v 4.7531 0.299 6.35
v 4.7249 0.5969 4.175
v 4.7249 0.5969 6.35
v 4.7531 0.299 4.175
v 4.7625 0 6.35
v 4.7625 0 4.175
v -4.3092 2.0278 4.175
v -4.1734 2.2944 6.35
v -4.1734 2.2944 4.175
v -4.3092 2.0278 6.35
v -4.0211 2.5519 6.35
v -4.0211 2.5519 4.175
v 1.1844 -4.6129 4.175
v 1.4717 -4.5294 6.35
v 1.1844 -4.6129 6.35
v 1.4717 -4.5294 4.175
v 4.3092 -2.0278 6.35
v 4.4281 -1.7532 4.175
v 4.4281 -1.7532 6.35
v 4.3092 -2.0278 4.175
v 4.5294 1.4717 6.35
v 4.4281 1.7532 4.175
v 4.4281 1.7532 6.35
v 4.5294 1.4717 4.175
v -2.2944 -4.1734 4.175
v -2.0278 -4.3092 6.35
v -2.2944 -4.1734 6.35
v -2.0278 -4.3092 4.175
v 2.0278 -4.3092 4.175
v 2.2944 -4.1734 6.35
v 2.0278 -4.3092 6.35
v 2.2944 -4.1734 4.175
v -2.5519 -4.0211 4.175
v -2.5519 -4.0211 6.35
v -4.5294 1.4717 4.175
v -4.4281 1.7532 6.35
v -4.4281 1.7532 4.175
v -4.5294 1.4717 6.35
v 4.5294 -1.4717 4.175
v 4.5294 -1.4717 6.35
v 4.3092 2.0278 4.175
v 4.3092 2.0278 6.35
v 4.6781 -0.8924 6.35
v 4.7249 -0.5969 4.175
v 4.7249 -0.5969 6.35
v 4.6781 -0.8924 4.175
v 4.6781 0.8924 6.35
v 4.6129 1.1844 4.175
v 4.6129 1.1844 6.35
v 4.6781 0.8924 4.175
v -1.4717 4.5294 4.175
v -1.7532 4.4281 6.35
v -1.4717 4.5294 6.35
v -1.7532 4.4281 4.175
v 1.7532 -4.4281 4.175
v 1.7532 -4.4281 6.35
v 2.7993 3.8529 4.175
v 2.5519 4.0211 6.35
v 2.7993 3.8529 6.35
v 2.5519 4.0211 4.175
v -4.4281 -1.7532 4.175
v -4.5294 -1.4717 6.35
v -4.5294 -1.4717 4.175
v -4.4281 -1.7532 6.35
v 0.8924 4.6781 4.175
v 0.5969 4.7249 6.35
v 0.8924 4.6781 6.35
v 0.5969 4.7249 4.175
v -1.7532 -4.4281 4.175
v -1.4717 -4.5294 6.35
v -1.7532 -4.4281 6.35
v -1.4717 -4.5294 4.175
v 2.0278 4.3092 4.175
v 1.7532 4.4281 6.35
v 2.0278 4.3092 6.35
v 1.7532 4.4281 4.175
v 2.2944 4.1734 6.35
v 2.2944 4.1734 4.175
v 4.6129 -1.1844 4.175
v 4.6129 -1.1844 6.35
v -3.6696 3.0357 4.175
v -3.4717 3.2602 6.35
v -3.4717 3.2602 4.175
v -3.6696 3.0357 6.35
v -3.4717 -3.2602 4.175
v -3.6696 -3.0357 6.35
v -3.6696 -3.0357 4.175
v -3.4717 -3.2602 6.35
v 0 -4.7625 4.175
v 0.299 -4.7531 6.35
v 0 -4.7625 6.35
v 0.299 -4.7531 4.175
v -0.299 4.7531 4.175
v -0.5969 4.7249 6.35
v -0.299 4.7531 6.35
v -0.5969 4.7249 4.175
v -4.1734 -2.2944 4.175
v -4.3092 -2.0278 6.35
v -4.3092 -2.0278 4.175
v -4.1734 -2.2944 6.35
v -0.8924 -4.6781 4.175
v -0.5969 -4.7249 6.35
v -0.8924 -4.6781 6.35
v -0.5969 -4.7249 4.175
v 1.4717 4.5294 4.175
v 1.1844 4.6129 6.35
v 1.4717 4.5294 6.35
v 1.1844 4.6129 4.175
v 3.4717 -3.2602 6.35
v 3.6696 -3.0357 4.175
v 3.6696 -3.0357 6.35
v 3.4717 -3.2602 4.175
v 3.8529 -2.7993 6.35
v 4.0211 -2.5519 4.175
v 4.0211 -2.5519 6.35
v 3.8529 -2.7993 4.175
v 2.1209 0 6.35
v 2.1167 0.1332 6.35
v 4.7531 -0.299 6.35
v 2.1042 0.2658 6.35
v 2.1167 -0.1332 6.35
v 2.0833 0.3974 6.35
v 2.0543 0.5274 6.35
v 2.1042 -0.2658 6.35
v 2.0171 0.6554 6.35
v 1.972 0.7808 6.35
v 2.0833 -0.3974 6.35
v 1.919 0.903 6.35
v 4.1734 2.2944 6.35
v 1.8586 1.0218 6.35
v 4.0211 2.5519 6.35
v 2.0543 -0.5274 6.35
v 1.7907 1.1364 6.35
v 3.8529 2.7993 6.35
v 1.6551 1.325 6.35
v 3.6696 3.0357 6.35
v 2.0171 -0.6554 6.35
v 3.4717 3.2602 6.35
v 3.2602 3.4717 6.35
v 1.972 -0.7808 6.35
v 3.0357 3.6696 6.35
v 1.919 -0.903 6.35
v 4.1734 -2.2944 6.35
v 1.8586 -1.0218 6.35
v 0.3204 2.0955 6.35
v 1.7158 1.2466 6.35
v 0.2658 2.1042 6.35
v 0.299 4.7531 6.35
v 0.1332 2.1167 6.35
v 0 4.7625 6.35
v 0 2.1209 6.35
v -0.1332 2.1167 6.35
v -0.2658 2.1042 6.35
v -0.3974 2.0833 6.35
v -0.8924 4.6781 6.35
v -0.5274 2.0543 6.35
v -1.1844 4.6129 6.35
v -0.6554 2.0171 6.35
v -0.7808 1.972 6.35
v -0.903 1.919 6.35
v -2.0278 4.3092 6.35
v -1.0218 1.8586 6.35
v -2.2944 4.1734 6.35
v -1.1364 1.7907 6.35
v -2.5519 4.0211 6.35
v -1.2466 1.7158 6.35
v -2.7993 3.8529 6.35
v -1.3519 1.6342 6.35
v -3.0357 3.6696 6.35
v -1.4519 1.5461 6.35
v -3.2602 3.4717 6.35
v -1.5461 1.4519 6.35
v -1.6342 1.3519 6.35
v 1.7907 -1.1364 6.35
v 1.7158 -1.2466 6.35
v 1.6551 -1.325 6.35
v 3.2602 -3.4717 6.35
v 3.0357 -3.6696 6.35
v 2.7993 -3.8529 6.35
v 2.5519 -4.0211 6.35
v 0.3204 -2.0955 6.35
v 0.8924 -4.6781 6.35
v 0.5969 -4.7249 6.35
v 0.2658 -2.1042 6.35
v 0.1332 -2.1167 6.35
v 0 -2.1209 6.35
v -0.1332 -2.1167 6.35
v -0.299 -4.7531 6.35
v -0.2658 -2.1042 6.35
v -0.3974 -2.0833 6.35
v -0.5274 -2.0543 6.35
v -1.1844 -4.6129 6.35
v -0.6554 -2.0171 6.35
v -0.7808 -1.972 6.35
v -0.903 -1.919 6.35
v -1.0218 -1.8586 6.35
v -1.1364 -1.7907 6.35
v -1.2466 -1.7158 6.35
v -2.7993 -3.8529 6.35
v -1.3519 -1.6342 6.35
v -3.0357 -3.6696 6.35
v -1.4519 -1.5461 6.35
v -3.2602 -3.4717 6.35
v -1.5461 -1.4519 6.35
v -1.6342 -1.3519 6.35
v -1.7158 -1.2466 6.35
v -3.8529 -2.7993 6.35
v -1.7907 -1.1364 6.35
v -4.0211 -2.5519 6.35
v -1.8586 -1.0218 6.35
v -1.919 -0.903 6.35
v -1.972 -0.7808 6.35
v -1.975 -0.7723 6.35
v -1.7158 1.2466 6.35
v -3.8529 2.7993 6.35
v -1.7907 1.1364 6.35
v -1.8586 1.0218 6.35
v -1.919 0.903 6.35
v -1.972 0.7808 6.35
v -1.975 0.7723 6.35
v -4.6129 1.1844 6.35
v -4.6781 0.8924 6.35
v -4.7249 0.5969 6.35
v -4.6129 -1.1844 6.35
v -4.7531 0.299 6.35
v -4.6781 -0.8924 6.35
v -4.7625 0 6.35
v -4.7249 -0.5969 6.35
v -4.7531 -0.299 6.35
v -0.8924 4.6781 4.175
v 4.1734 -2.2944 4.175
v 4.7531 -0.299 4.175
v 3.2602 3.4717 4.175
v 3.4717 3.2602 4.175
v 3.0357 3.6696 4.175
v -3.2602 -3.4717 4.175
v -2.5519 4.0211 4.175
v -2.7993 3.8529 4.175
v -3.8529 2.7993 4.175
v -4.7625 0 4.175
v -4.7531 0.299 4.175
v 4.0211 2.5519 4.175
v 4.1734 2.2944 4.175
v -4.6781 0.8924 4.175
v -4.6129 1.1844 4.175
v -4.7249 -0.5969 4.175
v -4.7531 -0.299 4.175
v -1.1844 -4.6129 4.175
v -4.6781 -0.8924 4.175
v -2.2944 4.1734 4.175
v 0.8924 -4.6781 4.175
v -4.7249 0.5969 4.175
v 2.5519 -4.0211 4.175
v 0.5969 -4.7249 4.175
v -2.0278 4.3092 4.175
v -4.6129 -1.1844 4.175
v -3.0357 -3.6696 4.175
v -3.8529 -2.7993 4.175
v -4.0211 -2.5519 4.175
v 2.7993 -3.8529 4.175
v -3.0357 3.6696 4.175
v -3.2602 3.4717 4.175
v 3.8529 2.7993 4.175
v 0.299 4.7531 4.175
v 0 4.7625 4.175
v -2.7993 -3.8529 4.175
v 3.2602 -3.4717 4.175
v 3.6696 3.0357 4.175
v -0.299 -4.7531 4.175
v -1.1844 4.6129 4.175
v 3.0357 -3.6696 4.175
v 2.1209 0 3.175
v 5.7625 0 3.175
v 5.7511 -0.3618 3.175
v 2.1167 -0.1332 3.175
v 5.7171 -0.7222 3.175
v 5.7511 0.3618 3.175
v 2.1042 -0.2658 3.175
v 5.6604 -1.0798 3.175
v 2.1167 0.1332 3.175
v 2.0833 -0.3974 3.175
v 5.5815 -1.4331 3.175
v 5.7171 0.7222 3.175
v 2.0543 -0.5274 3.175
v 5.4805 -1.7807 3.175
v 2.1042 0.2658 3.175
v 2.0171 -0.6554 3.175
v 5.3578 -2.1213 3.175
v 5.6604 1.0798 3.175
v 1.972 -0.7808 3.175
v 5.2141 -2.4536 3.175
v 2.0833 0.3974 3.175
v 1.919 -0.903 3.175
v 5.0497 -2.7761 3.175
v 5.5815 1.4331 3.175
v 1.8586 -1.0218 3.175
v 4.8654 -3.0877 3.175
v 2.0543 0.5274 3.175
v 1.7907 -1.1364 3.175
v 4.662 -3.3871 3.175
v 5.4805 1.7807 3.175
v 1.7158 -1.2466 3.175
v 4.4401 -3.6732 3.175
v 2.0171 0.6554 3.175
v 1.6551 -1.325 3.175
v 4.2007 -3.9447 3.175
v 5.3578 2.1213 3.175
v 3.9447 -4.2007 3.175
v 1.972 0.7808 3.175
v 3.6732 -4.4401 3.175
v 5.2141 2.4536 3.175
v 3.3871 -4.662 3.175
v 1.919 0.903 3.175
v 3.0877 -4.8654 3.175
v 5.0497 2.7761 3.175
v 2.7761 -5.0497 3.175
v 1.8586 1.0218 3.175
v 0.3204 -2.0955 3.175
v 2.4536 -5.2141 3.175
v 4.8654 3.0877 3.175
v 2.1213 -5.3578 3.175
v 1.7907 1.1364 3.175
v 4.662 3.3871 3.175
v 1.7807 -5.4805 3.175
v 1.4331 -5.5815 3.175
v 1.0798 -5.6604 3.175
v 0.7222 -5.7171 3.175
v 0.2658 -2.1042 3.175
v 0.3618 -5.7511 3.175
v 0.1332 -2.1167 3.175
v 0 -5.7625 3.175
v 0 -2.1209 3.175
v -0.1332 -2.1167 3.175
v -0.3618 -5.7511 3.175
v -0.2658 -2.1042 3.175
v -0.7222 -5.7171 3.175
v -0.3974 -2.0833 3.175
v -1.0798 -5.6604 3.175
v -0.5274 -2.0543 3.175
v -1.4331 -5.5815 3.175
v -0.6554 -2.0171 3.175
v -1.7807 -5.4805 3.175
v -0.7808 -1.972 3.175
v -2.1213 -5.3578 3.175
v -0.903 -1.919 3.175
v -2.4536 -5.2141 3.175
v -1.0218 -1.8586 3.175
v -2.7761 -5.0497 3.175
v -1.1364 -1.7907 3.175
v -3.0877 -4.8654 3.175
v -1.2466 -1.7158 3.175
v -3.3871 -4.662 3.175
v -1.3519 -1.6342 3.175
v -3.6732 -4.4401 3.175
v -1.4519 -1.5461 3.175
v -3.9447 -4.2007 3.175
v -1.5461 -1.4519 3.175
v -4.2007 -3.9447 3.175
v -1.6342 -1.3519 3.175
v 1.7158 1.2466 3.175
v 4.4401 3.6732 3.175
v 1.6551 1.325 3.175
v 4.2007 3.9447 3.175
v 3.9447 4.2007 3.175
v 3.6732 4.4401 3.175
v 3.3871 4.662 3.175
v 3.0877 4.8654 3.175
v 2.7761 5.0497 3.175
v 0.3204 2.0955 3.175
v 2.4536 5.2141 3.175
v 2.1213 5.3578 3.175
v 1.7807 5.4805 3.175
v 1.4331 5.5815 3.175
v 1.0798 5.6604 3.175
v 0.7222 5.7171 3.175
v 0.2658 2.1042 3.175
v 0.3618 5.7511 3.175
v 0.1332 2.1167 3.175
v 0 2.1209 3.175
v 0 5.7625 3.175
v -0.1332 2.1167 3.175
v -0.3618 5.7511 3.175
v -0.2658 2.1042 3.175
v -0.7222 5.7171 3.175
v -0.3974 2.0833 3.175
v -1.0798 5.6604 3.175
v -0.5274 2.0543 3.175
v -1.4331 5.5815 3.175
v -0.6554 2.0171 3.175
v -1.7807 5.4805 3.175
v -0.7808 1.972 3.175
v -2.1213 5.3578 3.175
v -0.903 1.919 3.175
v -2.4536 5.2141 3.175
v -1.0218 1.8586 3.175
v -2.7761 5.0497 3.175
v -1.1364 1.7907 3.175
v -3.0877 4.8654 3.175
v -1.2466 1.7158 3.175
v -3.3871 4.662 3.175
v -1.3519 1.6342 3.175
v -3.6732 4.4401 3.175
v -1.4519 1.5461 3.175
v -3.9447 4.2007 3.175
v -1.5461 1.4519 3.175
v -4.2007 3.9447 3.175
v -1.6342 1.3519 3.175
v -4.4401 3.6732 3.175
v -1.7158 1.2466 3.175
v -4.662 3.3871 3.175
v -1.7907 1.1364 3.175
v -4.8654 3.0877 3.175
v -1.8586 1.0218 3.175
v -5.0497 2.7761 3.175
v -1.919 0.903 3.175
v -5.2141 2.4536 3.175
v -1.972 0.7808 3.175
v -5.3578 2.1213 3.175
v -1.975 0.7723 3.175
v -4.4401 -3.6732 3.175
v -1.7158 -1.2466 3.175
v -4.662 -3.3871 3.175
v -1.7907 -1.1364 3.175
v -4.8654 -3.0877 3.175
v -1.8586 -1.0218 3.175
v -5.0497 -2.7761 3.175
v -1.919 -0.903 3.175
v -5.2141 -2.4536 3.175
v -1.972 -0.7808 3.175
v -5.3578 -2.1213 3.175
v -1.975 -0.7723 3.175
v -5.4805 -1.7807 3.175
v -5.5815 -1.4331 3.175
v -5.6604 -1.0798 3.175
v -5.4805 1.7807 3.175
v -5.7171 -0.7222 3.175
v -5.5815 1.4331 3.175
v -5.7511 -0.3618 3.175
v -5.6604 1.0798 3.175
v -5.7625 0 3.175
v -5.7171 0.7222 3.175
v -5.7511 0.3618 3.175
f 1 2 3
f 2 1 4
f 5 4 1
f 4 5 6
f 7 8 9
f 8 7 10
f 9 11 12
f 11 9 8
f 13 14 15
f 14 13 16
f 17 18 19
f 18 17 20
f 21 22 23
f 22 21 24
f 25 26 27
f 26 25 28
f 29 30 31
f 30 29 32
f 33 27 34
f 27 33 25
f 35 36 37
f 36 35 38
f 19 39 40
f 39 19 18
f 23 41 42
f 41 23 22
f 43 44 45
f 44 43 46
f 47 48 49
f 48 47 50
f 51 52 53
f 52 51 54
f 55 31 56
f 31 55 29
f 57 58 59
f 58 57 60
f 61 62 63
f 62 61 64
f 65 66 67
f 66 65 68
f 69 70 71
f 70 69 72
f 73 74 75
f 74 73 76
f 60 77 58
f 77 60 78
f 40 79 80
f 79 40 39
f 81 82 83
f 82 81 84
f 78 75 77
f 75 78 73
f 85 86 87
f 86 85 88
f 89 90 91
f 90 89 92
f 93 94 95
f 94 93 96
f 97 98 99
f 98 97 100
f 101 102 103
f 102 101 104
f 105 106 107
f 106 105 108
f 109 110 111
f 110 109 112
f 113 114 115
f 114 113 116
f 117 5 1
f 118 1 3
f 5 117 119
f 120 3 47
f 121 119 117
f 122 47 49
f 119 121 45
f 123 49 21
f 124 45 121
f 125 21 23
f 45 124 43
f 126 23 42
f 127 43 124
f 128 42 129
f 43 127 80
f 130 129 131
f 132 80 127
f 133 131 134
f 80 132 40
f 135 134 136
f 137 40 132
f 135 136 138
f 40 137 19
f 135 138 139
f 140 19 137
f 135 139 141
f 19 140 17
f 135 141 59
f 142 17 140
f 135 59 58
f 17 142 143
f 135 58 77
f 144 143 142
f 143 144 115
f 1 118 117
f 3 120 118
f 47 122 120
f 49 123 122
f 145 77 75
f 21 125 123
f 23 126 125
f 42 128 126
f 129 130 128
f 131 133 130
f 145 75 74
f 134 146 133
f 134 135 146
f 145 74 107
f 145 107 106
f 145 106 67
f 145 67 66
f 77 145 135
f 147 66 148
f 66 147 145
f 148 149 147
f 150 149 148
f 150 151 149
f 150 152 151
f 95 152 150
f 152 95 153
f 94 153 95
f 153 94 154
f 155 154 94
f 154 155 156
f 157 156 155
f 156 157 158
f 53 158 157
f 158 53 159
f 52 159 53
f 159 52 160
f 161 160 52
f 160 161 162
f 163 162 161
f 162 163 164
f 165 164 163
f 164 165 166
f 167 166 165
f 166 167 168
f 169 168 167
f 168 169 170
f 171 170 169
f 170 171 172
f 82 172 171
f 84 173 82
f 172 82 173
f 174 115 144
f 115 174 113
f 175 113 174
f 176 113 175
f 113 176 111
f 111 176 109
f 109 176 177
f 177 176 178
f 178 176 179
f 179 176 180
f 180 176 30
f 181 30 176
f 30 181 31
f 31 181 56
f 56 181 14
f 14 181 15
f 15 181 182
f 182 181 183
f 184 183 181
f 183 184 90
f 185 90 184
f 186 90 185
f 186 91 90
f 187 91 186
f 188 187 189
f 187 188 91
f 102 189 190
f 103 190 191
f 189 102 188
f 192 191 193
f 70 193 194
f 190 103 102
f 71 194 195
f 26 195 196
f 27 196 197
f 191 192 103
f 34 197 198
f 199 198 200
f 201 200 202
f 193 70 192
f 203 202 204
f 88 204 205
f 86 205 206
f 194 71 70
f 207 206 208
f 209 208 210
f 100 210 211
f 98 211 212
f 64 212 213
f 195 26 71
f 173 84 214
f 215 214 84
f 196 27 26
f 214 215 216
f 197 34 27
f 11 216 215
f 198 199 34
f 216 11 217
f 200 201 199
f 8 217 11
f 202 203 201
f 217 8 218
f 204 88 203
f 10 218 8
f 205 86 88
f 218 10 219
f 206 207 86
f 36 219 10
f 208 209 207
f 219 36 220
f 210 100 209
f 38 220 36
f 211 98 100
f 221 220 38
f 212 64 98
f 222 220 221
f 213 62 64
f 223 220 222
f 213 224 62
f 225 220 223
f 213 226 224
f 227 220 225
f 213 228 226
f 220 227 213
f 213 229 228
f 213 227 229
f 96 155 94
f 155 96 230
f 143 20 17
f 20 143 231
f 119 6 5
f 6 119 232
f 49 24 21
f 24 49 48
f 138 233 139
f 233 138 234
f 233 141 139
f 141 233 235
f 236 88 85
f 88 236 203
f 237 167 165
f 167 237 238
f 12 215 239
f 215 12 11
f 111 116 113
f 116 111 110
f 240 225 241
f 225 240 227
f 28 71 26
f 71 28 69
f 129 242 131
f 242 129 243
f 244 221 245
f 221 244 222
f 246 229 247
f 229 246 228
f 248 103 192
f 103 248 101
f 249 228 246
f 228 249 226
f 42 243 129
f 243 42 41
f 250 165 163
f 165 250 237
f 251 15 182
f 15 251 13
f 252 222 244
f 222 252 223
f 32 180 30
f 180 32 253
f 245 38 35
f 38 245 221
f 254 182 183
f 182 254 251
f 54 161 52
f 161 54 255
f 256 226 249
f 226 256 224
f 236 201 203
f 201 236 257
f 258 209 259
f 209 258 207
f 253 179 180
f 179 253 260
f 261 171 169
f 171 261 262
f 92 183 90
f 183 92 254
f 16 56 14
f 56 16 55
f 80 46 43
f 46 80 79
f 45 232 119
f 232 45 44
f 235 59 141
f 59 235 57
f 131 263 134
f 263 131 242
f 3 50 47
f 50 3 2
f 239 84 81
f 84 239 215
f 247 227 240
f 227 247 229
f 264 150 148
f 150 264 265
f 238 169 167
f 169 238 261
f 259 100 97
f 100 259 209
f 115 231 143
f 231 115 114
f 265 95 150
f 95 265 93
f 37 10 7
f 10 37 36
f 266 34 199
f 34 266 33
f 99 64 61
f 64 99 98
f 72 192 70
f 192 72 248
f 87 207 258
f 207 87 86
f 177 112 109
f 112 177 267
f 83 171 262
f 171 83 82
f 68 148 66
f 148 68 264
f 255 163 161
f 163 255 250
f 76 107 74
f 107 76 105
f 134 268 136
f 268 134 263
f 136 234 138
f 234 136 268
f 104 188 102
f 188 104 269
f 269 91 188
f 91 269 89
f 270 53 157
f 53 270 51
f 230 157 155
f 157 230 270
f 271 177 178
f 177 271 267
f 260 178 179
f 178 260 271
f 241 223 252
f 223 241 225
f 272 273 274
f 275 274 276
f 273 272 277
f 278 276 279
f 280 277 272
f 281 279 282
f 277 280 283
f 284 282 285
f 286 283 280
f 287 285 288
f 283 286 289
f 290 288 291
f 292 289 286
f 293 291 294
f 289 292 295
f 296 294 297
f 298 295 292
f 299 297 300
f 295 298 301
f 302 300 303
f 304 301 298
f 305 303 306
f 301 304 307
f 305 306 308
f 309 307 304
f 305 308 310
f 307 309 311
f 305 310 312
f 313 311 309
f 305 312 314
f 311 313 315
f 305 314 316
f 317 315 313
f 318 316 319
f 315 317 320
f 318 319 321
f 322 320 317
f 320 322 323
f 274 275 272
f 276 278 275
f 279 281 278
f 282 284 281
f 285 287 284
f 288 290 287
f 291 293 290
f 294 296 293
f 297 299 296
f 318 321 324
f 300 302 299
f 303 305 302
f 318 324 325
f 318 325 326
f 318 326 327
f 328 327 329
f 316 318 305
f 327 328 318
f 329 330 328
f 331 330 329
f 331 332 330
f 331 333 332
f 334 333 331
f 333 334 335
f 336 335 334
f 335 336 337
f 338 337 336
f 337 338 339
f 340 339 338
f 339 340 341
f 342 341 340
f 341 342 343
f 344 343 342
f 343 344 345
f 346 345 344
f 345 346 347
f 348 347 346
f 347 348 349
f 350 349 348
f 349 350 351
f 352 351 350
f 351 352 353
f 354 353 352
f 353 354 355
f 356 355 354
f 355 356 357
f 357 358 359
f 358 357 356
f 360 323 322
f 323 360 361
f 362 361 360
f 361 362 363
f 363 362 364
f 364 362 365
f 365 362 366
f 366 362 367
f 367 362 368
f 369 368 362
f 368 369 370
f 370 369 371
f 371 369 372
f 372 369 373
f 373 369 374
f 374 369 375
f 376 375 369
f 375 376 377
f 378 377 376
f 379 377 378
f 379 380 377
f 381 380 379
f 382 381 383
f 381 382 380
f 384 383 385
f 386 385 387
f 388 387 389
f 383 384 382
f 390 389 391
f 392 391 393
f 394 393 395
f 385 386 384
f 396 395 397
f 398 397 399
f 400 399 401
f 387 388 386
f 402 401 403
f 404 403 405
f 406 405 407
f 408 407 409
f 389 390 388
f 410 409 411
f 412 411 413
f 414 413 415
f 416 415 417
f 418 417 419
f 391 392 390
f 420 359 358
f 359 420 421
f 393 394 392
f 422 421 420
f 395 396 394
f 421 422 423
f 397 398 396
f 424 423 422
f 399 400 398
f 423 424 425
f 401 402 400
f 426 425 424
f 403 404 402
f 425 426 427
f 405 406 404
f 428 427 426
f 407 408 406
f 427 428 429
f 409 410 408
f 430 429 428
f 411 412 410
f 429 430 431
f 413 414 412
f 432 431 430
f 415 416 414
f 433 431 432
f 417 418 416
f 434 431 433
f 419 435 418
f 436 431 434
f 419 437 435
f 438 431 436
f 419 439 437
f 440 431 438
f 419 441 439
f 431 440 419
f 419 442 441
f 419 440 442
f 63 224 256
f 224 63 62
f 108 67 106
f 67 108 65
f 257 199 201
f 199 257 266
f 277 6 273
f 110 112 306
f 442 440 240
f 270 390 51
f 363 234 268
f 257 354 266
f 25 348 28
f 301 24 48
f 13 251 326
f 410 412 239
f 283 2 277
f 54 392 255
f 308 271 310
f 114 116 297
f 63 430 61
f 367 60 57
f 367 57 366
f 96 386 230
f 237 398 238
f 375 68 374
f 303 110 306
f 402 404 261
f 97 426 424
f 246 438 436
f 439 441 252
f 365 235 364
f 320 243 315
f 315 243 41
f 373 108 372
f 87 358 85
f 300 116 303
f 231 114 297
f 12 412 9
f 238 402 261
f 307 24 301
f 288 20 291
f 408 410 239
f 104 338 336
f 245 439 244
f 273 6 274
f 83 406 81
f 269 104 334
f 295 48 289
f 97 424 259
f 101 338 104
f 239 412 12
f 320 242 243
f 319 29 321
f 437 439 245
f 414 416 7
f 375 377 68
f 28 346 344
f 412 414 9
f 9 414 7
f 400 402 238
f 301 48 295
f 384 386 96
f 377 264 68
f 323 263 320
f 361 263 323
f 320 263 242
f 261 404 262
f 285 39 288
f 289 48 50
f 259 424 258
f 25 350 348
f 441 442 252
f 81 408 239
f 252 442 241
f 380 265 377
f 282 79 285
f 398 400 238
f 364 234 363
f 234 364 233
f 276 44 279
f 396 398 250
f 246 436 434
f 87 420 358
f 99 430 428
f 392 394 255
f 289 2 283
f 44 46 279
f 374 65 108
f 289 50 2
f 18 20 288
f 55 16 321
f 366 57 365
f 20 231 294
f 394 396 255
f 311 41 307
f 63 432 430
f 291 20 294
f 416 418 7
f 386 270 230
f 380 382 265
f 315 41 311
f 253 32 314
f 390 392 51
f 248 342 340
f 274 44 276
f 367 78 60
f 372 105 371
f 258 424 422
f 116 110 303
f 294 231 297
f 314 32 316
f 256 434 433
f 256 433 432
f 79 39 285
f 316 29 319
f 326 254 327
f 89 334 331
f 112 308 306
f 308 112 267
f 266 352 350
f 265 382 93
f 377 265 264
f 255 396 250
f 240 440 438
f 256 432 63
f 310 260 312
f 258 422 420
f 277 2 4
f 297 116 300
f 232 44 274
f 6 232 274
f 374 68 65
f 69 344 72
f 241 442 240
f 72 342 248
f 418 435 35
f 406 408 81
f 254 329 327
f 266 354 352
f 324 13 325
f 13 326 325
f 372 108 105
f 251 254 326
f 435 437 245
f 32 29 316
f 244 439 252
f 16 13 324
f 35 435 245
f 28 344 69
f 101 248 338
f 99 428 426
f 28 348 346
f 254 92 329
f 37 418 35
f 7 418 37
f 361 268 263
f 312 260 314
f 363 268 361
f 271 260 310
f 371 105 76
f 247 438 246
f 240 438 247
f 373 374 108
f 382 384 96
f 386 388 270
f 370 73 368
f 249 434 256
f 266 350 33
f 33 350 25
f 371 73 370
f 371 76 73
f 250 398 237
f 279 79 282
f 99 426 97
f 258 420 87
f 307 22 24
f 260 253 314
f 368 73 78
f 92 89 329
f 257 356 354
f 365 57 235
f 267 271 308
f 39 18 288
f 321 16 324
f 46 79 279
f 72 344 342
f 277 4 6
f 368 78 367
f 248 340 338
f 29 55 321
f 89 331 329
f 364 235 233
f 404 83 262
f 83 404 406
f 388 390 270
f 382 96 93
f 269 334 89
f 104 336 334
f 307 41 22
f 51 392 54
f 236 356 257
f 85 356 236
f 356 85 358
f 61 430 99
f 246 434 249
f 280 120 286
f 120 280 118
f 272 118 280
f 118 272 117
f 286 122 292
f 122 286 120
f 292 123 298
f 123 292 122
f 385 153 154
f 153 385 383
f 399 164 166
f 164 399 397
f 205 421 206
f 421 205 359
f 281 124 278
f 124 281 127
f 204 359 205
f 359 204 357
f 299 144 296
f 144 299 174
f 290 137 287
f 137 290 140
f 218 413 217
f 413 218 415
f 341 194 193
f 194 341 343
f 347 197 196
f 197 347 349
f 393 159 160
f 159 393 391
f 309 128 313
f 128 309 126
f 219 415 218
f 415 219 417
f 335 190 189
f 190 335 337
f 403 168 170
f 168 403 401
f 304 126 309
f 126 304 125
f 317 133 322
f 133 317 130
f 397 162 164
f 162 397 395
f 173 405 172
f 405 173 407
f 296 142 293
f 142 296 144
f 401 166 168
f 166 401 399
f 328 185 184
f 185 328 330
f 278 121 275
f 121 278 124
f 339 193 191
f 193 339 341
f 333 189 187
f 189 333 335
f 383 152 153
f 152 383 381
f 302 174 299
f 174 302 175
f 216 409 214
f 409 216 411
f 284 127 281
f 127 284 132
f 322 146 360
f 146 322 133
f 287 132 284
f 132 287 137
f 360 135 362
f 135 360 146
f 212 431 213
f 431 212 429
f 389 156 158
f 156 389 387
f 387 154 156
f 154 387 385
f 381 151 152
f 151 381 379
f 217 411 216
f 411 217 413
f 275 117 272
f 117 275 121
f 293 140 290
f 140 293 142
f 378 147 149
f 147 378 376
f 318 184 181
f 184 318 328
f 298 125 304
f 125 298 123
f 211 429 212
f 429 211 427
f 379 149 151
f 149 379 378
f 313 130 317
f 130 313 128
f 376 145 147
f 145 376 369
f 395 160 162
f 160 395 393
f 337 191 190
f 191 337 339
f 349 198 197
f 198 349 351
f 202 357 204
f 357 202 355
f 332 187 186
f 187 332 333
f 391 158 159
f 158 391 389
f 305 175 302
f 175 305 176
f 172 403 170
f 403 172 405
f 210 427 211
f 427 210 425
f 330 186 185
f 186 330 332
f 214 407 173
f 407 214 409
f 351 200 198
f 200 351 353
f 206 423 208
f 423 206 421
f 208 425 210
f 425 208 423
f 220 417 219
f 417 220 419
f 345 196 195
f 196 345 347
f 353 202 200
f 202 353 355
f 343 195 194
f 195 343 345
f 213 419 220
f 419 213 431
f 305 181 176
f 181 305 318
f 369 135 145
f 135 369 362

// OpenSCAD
// Meccano spur gear maker
//
// v1.0 - Apr 2, 2018 - initial release SWH
//
// Here's the 5 things you (may) need to set
//
// teeth: desired number of teeth
// gear_thickness: how many mm thick the gear disc should be
// dxf_path: the directory where the gear outline DXF files are
// boss_height: how many mm high above the gear the boss should extend.
// triflat: true for a triflat axle, false for a round axle
//
// It should go without saying that in order for this to work, a DXF
// outline file must exist to match the number of teeth you've chosen!
//
// imperial/metric constants
//
inch = 25.4;
half_inch = inch/2;
quarter_inch = inch/4;
//
$fn=100;                // let's have nice round circles by default
//
// parametric values
// ------------------------------------------------------------
//
teeth = 57;             // 15, 19, 25, 38, 50, 57, 95, 114, 121, 133
                        // if you want other values, you'll have to
                        // create your own gear outline at
                        // http://hessmer.org/gears/InvoluteSpurGearBuilder.html
gear_thickness = inch/8;
dxf_path = "/home/pi/Documents/3D/Things/Meccano/Gear_maker/Gear_outline_files/";
boss_height = inch/8; // set to zero for no boss
triflat = true;
boss_dia = 3/8*inch;

axle_dia = 0.167*inch;  // sized to pass a standard Meccano axle rod
flats_dia = 3.95;       // experimentally determined for a triflat axle... YMMV
//
// ------------------------------------------------------------
//

// Make the gear
if ( teeth < 57 ) {
    spur_gear(teeth);                    // no ring of holes
} else if ( teeth < 95 ) {
    spur_gear(teeth,1);                  // 1 ring of holes
} else {
    spur_gear(teeth,2);                  // 2 rings of holes and slots
}

// ------------------------------------------------------------
//
// tube: create a cylinder of the given length and diameter
// at the point [x,y,z]
//
module tube (length, diameter, x=0, y=0, z=0) {
    translate([x,y,z]) cylinder(length, r=diameter/2);
}

// ------------------------------------------------------------
//
// axle: create an axle with a particular cross section at [x,y,z]
//
// This is the function you'd modify to change the axle hole cross section.
// It's currently set up to create either tri-flat or round axle holes.
//
module axle(zlength, x=0, y=0, z=0) {
    if( triflat ) {
        intersection() {
            tube(zlength,axle_dia,x,y,z);
            // a circle with 3 sides is... you guessed, a triangle!
            linear_extrude(height=zlength) 
                translate([x,y,z]) circle(flats_dia,$fn=3);
        }
    } else {
        tube(zlength,axle_dia,x,y,z);
    }
}

// ------------------------------------------------------------
//
// do_rings: add either a single ring of holes or two rings
// with alternating holes and slots extending between the rings
//
// hole_ring_angle is best set to something that divides 360 evenly
//
module do_rings( hole_ring_angle, rings ) {
    hole_ring1_radius = half_inch;   // 1st ring at 0.5" radius
    hole_ring2_radius = inch;        // 2nd ring at 1.0" radius
    hole_ring_dia = 0.172 * inch;    // sized for Meccano
    for( angle=[0:hole_ring_angle:360-hole_ring_angle]) {
        rotate([0,0,angle])
            tube(gear_thickness,hole_ring_dia,hole_ring1_radius,0,0);
        if( rings == 2 ) {
            rotate([0,0,angle]) 
                tube(gear_thickness,hole_ring_dia,hole_ring2_radius);
            rotate([0,0,angle+hole_ring_angle/2]) hull() {
                tube(gear_thickness,hole_ring_dia,hole_ring1_radius);
                tube(gear_thickness,hole_ring_dia,hole_ring2_radius);
            }
        }
    }
}

// ------------------------------------------------------------
//
// create a spur gear
//
// inputs:
//
// teeth: 15, 19, 25, 38, 50, 57, 95, 114, 121, 133
// rings: 0, 1, 2 (no holes, 1 ring of 8 holes, 2 rings of 4 holes and 4 slots)
// holes: number of holes (or holes+slots) in each ring. defaults to 8
//
module spur_gear(teeth,rings=0,num_holes=8) {
    gear_outline = str(dxf_path,teeth,"teeth.dxf");
    collar_width = 1; // a little angled collar between the boss and disc to add strength
    difference() {
        union() {
            linear_extrude(height=gear_thickness)
                import(gear_outline,convexity=10);
            if( boss_height>0 ) {
                tube(boss_height, boss_dia, 0, 0, gear_thickness);
                if( boss_height>=collar_width ) {
                    translate([0,0,gear_thickness])
                        cylinder(h=collar_width,d1=boss_dia+2*collar_width,d2=boss_dia);
                }
            }
        }

        axle(boss_height+gear_thickness);

        if( rings > 0 ) {
            if ( rings == 1 ) {
                do_rings(360/num_holes,1);
            } else if ( rings == 2 ) {
                do_rings(720/num_holes,2);
            }
        }
    }
}
